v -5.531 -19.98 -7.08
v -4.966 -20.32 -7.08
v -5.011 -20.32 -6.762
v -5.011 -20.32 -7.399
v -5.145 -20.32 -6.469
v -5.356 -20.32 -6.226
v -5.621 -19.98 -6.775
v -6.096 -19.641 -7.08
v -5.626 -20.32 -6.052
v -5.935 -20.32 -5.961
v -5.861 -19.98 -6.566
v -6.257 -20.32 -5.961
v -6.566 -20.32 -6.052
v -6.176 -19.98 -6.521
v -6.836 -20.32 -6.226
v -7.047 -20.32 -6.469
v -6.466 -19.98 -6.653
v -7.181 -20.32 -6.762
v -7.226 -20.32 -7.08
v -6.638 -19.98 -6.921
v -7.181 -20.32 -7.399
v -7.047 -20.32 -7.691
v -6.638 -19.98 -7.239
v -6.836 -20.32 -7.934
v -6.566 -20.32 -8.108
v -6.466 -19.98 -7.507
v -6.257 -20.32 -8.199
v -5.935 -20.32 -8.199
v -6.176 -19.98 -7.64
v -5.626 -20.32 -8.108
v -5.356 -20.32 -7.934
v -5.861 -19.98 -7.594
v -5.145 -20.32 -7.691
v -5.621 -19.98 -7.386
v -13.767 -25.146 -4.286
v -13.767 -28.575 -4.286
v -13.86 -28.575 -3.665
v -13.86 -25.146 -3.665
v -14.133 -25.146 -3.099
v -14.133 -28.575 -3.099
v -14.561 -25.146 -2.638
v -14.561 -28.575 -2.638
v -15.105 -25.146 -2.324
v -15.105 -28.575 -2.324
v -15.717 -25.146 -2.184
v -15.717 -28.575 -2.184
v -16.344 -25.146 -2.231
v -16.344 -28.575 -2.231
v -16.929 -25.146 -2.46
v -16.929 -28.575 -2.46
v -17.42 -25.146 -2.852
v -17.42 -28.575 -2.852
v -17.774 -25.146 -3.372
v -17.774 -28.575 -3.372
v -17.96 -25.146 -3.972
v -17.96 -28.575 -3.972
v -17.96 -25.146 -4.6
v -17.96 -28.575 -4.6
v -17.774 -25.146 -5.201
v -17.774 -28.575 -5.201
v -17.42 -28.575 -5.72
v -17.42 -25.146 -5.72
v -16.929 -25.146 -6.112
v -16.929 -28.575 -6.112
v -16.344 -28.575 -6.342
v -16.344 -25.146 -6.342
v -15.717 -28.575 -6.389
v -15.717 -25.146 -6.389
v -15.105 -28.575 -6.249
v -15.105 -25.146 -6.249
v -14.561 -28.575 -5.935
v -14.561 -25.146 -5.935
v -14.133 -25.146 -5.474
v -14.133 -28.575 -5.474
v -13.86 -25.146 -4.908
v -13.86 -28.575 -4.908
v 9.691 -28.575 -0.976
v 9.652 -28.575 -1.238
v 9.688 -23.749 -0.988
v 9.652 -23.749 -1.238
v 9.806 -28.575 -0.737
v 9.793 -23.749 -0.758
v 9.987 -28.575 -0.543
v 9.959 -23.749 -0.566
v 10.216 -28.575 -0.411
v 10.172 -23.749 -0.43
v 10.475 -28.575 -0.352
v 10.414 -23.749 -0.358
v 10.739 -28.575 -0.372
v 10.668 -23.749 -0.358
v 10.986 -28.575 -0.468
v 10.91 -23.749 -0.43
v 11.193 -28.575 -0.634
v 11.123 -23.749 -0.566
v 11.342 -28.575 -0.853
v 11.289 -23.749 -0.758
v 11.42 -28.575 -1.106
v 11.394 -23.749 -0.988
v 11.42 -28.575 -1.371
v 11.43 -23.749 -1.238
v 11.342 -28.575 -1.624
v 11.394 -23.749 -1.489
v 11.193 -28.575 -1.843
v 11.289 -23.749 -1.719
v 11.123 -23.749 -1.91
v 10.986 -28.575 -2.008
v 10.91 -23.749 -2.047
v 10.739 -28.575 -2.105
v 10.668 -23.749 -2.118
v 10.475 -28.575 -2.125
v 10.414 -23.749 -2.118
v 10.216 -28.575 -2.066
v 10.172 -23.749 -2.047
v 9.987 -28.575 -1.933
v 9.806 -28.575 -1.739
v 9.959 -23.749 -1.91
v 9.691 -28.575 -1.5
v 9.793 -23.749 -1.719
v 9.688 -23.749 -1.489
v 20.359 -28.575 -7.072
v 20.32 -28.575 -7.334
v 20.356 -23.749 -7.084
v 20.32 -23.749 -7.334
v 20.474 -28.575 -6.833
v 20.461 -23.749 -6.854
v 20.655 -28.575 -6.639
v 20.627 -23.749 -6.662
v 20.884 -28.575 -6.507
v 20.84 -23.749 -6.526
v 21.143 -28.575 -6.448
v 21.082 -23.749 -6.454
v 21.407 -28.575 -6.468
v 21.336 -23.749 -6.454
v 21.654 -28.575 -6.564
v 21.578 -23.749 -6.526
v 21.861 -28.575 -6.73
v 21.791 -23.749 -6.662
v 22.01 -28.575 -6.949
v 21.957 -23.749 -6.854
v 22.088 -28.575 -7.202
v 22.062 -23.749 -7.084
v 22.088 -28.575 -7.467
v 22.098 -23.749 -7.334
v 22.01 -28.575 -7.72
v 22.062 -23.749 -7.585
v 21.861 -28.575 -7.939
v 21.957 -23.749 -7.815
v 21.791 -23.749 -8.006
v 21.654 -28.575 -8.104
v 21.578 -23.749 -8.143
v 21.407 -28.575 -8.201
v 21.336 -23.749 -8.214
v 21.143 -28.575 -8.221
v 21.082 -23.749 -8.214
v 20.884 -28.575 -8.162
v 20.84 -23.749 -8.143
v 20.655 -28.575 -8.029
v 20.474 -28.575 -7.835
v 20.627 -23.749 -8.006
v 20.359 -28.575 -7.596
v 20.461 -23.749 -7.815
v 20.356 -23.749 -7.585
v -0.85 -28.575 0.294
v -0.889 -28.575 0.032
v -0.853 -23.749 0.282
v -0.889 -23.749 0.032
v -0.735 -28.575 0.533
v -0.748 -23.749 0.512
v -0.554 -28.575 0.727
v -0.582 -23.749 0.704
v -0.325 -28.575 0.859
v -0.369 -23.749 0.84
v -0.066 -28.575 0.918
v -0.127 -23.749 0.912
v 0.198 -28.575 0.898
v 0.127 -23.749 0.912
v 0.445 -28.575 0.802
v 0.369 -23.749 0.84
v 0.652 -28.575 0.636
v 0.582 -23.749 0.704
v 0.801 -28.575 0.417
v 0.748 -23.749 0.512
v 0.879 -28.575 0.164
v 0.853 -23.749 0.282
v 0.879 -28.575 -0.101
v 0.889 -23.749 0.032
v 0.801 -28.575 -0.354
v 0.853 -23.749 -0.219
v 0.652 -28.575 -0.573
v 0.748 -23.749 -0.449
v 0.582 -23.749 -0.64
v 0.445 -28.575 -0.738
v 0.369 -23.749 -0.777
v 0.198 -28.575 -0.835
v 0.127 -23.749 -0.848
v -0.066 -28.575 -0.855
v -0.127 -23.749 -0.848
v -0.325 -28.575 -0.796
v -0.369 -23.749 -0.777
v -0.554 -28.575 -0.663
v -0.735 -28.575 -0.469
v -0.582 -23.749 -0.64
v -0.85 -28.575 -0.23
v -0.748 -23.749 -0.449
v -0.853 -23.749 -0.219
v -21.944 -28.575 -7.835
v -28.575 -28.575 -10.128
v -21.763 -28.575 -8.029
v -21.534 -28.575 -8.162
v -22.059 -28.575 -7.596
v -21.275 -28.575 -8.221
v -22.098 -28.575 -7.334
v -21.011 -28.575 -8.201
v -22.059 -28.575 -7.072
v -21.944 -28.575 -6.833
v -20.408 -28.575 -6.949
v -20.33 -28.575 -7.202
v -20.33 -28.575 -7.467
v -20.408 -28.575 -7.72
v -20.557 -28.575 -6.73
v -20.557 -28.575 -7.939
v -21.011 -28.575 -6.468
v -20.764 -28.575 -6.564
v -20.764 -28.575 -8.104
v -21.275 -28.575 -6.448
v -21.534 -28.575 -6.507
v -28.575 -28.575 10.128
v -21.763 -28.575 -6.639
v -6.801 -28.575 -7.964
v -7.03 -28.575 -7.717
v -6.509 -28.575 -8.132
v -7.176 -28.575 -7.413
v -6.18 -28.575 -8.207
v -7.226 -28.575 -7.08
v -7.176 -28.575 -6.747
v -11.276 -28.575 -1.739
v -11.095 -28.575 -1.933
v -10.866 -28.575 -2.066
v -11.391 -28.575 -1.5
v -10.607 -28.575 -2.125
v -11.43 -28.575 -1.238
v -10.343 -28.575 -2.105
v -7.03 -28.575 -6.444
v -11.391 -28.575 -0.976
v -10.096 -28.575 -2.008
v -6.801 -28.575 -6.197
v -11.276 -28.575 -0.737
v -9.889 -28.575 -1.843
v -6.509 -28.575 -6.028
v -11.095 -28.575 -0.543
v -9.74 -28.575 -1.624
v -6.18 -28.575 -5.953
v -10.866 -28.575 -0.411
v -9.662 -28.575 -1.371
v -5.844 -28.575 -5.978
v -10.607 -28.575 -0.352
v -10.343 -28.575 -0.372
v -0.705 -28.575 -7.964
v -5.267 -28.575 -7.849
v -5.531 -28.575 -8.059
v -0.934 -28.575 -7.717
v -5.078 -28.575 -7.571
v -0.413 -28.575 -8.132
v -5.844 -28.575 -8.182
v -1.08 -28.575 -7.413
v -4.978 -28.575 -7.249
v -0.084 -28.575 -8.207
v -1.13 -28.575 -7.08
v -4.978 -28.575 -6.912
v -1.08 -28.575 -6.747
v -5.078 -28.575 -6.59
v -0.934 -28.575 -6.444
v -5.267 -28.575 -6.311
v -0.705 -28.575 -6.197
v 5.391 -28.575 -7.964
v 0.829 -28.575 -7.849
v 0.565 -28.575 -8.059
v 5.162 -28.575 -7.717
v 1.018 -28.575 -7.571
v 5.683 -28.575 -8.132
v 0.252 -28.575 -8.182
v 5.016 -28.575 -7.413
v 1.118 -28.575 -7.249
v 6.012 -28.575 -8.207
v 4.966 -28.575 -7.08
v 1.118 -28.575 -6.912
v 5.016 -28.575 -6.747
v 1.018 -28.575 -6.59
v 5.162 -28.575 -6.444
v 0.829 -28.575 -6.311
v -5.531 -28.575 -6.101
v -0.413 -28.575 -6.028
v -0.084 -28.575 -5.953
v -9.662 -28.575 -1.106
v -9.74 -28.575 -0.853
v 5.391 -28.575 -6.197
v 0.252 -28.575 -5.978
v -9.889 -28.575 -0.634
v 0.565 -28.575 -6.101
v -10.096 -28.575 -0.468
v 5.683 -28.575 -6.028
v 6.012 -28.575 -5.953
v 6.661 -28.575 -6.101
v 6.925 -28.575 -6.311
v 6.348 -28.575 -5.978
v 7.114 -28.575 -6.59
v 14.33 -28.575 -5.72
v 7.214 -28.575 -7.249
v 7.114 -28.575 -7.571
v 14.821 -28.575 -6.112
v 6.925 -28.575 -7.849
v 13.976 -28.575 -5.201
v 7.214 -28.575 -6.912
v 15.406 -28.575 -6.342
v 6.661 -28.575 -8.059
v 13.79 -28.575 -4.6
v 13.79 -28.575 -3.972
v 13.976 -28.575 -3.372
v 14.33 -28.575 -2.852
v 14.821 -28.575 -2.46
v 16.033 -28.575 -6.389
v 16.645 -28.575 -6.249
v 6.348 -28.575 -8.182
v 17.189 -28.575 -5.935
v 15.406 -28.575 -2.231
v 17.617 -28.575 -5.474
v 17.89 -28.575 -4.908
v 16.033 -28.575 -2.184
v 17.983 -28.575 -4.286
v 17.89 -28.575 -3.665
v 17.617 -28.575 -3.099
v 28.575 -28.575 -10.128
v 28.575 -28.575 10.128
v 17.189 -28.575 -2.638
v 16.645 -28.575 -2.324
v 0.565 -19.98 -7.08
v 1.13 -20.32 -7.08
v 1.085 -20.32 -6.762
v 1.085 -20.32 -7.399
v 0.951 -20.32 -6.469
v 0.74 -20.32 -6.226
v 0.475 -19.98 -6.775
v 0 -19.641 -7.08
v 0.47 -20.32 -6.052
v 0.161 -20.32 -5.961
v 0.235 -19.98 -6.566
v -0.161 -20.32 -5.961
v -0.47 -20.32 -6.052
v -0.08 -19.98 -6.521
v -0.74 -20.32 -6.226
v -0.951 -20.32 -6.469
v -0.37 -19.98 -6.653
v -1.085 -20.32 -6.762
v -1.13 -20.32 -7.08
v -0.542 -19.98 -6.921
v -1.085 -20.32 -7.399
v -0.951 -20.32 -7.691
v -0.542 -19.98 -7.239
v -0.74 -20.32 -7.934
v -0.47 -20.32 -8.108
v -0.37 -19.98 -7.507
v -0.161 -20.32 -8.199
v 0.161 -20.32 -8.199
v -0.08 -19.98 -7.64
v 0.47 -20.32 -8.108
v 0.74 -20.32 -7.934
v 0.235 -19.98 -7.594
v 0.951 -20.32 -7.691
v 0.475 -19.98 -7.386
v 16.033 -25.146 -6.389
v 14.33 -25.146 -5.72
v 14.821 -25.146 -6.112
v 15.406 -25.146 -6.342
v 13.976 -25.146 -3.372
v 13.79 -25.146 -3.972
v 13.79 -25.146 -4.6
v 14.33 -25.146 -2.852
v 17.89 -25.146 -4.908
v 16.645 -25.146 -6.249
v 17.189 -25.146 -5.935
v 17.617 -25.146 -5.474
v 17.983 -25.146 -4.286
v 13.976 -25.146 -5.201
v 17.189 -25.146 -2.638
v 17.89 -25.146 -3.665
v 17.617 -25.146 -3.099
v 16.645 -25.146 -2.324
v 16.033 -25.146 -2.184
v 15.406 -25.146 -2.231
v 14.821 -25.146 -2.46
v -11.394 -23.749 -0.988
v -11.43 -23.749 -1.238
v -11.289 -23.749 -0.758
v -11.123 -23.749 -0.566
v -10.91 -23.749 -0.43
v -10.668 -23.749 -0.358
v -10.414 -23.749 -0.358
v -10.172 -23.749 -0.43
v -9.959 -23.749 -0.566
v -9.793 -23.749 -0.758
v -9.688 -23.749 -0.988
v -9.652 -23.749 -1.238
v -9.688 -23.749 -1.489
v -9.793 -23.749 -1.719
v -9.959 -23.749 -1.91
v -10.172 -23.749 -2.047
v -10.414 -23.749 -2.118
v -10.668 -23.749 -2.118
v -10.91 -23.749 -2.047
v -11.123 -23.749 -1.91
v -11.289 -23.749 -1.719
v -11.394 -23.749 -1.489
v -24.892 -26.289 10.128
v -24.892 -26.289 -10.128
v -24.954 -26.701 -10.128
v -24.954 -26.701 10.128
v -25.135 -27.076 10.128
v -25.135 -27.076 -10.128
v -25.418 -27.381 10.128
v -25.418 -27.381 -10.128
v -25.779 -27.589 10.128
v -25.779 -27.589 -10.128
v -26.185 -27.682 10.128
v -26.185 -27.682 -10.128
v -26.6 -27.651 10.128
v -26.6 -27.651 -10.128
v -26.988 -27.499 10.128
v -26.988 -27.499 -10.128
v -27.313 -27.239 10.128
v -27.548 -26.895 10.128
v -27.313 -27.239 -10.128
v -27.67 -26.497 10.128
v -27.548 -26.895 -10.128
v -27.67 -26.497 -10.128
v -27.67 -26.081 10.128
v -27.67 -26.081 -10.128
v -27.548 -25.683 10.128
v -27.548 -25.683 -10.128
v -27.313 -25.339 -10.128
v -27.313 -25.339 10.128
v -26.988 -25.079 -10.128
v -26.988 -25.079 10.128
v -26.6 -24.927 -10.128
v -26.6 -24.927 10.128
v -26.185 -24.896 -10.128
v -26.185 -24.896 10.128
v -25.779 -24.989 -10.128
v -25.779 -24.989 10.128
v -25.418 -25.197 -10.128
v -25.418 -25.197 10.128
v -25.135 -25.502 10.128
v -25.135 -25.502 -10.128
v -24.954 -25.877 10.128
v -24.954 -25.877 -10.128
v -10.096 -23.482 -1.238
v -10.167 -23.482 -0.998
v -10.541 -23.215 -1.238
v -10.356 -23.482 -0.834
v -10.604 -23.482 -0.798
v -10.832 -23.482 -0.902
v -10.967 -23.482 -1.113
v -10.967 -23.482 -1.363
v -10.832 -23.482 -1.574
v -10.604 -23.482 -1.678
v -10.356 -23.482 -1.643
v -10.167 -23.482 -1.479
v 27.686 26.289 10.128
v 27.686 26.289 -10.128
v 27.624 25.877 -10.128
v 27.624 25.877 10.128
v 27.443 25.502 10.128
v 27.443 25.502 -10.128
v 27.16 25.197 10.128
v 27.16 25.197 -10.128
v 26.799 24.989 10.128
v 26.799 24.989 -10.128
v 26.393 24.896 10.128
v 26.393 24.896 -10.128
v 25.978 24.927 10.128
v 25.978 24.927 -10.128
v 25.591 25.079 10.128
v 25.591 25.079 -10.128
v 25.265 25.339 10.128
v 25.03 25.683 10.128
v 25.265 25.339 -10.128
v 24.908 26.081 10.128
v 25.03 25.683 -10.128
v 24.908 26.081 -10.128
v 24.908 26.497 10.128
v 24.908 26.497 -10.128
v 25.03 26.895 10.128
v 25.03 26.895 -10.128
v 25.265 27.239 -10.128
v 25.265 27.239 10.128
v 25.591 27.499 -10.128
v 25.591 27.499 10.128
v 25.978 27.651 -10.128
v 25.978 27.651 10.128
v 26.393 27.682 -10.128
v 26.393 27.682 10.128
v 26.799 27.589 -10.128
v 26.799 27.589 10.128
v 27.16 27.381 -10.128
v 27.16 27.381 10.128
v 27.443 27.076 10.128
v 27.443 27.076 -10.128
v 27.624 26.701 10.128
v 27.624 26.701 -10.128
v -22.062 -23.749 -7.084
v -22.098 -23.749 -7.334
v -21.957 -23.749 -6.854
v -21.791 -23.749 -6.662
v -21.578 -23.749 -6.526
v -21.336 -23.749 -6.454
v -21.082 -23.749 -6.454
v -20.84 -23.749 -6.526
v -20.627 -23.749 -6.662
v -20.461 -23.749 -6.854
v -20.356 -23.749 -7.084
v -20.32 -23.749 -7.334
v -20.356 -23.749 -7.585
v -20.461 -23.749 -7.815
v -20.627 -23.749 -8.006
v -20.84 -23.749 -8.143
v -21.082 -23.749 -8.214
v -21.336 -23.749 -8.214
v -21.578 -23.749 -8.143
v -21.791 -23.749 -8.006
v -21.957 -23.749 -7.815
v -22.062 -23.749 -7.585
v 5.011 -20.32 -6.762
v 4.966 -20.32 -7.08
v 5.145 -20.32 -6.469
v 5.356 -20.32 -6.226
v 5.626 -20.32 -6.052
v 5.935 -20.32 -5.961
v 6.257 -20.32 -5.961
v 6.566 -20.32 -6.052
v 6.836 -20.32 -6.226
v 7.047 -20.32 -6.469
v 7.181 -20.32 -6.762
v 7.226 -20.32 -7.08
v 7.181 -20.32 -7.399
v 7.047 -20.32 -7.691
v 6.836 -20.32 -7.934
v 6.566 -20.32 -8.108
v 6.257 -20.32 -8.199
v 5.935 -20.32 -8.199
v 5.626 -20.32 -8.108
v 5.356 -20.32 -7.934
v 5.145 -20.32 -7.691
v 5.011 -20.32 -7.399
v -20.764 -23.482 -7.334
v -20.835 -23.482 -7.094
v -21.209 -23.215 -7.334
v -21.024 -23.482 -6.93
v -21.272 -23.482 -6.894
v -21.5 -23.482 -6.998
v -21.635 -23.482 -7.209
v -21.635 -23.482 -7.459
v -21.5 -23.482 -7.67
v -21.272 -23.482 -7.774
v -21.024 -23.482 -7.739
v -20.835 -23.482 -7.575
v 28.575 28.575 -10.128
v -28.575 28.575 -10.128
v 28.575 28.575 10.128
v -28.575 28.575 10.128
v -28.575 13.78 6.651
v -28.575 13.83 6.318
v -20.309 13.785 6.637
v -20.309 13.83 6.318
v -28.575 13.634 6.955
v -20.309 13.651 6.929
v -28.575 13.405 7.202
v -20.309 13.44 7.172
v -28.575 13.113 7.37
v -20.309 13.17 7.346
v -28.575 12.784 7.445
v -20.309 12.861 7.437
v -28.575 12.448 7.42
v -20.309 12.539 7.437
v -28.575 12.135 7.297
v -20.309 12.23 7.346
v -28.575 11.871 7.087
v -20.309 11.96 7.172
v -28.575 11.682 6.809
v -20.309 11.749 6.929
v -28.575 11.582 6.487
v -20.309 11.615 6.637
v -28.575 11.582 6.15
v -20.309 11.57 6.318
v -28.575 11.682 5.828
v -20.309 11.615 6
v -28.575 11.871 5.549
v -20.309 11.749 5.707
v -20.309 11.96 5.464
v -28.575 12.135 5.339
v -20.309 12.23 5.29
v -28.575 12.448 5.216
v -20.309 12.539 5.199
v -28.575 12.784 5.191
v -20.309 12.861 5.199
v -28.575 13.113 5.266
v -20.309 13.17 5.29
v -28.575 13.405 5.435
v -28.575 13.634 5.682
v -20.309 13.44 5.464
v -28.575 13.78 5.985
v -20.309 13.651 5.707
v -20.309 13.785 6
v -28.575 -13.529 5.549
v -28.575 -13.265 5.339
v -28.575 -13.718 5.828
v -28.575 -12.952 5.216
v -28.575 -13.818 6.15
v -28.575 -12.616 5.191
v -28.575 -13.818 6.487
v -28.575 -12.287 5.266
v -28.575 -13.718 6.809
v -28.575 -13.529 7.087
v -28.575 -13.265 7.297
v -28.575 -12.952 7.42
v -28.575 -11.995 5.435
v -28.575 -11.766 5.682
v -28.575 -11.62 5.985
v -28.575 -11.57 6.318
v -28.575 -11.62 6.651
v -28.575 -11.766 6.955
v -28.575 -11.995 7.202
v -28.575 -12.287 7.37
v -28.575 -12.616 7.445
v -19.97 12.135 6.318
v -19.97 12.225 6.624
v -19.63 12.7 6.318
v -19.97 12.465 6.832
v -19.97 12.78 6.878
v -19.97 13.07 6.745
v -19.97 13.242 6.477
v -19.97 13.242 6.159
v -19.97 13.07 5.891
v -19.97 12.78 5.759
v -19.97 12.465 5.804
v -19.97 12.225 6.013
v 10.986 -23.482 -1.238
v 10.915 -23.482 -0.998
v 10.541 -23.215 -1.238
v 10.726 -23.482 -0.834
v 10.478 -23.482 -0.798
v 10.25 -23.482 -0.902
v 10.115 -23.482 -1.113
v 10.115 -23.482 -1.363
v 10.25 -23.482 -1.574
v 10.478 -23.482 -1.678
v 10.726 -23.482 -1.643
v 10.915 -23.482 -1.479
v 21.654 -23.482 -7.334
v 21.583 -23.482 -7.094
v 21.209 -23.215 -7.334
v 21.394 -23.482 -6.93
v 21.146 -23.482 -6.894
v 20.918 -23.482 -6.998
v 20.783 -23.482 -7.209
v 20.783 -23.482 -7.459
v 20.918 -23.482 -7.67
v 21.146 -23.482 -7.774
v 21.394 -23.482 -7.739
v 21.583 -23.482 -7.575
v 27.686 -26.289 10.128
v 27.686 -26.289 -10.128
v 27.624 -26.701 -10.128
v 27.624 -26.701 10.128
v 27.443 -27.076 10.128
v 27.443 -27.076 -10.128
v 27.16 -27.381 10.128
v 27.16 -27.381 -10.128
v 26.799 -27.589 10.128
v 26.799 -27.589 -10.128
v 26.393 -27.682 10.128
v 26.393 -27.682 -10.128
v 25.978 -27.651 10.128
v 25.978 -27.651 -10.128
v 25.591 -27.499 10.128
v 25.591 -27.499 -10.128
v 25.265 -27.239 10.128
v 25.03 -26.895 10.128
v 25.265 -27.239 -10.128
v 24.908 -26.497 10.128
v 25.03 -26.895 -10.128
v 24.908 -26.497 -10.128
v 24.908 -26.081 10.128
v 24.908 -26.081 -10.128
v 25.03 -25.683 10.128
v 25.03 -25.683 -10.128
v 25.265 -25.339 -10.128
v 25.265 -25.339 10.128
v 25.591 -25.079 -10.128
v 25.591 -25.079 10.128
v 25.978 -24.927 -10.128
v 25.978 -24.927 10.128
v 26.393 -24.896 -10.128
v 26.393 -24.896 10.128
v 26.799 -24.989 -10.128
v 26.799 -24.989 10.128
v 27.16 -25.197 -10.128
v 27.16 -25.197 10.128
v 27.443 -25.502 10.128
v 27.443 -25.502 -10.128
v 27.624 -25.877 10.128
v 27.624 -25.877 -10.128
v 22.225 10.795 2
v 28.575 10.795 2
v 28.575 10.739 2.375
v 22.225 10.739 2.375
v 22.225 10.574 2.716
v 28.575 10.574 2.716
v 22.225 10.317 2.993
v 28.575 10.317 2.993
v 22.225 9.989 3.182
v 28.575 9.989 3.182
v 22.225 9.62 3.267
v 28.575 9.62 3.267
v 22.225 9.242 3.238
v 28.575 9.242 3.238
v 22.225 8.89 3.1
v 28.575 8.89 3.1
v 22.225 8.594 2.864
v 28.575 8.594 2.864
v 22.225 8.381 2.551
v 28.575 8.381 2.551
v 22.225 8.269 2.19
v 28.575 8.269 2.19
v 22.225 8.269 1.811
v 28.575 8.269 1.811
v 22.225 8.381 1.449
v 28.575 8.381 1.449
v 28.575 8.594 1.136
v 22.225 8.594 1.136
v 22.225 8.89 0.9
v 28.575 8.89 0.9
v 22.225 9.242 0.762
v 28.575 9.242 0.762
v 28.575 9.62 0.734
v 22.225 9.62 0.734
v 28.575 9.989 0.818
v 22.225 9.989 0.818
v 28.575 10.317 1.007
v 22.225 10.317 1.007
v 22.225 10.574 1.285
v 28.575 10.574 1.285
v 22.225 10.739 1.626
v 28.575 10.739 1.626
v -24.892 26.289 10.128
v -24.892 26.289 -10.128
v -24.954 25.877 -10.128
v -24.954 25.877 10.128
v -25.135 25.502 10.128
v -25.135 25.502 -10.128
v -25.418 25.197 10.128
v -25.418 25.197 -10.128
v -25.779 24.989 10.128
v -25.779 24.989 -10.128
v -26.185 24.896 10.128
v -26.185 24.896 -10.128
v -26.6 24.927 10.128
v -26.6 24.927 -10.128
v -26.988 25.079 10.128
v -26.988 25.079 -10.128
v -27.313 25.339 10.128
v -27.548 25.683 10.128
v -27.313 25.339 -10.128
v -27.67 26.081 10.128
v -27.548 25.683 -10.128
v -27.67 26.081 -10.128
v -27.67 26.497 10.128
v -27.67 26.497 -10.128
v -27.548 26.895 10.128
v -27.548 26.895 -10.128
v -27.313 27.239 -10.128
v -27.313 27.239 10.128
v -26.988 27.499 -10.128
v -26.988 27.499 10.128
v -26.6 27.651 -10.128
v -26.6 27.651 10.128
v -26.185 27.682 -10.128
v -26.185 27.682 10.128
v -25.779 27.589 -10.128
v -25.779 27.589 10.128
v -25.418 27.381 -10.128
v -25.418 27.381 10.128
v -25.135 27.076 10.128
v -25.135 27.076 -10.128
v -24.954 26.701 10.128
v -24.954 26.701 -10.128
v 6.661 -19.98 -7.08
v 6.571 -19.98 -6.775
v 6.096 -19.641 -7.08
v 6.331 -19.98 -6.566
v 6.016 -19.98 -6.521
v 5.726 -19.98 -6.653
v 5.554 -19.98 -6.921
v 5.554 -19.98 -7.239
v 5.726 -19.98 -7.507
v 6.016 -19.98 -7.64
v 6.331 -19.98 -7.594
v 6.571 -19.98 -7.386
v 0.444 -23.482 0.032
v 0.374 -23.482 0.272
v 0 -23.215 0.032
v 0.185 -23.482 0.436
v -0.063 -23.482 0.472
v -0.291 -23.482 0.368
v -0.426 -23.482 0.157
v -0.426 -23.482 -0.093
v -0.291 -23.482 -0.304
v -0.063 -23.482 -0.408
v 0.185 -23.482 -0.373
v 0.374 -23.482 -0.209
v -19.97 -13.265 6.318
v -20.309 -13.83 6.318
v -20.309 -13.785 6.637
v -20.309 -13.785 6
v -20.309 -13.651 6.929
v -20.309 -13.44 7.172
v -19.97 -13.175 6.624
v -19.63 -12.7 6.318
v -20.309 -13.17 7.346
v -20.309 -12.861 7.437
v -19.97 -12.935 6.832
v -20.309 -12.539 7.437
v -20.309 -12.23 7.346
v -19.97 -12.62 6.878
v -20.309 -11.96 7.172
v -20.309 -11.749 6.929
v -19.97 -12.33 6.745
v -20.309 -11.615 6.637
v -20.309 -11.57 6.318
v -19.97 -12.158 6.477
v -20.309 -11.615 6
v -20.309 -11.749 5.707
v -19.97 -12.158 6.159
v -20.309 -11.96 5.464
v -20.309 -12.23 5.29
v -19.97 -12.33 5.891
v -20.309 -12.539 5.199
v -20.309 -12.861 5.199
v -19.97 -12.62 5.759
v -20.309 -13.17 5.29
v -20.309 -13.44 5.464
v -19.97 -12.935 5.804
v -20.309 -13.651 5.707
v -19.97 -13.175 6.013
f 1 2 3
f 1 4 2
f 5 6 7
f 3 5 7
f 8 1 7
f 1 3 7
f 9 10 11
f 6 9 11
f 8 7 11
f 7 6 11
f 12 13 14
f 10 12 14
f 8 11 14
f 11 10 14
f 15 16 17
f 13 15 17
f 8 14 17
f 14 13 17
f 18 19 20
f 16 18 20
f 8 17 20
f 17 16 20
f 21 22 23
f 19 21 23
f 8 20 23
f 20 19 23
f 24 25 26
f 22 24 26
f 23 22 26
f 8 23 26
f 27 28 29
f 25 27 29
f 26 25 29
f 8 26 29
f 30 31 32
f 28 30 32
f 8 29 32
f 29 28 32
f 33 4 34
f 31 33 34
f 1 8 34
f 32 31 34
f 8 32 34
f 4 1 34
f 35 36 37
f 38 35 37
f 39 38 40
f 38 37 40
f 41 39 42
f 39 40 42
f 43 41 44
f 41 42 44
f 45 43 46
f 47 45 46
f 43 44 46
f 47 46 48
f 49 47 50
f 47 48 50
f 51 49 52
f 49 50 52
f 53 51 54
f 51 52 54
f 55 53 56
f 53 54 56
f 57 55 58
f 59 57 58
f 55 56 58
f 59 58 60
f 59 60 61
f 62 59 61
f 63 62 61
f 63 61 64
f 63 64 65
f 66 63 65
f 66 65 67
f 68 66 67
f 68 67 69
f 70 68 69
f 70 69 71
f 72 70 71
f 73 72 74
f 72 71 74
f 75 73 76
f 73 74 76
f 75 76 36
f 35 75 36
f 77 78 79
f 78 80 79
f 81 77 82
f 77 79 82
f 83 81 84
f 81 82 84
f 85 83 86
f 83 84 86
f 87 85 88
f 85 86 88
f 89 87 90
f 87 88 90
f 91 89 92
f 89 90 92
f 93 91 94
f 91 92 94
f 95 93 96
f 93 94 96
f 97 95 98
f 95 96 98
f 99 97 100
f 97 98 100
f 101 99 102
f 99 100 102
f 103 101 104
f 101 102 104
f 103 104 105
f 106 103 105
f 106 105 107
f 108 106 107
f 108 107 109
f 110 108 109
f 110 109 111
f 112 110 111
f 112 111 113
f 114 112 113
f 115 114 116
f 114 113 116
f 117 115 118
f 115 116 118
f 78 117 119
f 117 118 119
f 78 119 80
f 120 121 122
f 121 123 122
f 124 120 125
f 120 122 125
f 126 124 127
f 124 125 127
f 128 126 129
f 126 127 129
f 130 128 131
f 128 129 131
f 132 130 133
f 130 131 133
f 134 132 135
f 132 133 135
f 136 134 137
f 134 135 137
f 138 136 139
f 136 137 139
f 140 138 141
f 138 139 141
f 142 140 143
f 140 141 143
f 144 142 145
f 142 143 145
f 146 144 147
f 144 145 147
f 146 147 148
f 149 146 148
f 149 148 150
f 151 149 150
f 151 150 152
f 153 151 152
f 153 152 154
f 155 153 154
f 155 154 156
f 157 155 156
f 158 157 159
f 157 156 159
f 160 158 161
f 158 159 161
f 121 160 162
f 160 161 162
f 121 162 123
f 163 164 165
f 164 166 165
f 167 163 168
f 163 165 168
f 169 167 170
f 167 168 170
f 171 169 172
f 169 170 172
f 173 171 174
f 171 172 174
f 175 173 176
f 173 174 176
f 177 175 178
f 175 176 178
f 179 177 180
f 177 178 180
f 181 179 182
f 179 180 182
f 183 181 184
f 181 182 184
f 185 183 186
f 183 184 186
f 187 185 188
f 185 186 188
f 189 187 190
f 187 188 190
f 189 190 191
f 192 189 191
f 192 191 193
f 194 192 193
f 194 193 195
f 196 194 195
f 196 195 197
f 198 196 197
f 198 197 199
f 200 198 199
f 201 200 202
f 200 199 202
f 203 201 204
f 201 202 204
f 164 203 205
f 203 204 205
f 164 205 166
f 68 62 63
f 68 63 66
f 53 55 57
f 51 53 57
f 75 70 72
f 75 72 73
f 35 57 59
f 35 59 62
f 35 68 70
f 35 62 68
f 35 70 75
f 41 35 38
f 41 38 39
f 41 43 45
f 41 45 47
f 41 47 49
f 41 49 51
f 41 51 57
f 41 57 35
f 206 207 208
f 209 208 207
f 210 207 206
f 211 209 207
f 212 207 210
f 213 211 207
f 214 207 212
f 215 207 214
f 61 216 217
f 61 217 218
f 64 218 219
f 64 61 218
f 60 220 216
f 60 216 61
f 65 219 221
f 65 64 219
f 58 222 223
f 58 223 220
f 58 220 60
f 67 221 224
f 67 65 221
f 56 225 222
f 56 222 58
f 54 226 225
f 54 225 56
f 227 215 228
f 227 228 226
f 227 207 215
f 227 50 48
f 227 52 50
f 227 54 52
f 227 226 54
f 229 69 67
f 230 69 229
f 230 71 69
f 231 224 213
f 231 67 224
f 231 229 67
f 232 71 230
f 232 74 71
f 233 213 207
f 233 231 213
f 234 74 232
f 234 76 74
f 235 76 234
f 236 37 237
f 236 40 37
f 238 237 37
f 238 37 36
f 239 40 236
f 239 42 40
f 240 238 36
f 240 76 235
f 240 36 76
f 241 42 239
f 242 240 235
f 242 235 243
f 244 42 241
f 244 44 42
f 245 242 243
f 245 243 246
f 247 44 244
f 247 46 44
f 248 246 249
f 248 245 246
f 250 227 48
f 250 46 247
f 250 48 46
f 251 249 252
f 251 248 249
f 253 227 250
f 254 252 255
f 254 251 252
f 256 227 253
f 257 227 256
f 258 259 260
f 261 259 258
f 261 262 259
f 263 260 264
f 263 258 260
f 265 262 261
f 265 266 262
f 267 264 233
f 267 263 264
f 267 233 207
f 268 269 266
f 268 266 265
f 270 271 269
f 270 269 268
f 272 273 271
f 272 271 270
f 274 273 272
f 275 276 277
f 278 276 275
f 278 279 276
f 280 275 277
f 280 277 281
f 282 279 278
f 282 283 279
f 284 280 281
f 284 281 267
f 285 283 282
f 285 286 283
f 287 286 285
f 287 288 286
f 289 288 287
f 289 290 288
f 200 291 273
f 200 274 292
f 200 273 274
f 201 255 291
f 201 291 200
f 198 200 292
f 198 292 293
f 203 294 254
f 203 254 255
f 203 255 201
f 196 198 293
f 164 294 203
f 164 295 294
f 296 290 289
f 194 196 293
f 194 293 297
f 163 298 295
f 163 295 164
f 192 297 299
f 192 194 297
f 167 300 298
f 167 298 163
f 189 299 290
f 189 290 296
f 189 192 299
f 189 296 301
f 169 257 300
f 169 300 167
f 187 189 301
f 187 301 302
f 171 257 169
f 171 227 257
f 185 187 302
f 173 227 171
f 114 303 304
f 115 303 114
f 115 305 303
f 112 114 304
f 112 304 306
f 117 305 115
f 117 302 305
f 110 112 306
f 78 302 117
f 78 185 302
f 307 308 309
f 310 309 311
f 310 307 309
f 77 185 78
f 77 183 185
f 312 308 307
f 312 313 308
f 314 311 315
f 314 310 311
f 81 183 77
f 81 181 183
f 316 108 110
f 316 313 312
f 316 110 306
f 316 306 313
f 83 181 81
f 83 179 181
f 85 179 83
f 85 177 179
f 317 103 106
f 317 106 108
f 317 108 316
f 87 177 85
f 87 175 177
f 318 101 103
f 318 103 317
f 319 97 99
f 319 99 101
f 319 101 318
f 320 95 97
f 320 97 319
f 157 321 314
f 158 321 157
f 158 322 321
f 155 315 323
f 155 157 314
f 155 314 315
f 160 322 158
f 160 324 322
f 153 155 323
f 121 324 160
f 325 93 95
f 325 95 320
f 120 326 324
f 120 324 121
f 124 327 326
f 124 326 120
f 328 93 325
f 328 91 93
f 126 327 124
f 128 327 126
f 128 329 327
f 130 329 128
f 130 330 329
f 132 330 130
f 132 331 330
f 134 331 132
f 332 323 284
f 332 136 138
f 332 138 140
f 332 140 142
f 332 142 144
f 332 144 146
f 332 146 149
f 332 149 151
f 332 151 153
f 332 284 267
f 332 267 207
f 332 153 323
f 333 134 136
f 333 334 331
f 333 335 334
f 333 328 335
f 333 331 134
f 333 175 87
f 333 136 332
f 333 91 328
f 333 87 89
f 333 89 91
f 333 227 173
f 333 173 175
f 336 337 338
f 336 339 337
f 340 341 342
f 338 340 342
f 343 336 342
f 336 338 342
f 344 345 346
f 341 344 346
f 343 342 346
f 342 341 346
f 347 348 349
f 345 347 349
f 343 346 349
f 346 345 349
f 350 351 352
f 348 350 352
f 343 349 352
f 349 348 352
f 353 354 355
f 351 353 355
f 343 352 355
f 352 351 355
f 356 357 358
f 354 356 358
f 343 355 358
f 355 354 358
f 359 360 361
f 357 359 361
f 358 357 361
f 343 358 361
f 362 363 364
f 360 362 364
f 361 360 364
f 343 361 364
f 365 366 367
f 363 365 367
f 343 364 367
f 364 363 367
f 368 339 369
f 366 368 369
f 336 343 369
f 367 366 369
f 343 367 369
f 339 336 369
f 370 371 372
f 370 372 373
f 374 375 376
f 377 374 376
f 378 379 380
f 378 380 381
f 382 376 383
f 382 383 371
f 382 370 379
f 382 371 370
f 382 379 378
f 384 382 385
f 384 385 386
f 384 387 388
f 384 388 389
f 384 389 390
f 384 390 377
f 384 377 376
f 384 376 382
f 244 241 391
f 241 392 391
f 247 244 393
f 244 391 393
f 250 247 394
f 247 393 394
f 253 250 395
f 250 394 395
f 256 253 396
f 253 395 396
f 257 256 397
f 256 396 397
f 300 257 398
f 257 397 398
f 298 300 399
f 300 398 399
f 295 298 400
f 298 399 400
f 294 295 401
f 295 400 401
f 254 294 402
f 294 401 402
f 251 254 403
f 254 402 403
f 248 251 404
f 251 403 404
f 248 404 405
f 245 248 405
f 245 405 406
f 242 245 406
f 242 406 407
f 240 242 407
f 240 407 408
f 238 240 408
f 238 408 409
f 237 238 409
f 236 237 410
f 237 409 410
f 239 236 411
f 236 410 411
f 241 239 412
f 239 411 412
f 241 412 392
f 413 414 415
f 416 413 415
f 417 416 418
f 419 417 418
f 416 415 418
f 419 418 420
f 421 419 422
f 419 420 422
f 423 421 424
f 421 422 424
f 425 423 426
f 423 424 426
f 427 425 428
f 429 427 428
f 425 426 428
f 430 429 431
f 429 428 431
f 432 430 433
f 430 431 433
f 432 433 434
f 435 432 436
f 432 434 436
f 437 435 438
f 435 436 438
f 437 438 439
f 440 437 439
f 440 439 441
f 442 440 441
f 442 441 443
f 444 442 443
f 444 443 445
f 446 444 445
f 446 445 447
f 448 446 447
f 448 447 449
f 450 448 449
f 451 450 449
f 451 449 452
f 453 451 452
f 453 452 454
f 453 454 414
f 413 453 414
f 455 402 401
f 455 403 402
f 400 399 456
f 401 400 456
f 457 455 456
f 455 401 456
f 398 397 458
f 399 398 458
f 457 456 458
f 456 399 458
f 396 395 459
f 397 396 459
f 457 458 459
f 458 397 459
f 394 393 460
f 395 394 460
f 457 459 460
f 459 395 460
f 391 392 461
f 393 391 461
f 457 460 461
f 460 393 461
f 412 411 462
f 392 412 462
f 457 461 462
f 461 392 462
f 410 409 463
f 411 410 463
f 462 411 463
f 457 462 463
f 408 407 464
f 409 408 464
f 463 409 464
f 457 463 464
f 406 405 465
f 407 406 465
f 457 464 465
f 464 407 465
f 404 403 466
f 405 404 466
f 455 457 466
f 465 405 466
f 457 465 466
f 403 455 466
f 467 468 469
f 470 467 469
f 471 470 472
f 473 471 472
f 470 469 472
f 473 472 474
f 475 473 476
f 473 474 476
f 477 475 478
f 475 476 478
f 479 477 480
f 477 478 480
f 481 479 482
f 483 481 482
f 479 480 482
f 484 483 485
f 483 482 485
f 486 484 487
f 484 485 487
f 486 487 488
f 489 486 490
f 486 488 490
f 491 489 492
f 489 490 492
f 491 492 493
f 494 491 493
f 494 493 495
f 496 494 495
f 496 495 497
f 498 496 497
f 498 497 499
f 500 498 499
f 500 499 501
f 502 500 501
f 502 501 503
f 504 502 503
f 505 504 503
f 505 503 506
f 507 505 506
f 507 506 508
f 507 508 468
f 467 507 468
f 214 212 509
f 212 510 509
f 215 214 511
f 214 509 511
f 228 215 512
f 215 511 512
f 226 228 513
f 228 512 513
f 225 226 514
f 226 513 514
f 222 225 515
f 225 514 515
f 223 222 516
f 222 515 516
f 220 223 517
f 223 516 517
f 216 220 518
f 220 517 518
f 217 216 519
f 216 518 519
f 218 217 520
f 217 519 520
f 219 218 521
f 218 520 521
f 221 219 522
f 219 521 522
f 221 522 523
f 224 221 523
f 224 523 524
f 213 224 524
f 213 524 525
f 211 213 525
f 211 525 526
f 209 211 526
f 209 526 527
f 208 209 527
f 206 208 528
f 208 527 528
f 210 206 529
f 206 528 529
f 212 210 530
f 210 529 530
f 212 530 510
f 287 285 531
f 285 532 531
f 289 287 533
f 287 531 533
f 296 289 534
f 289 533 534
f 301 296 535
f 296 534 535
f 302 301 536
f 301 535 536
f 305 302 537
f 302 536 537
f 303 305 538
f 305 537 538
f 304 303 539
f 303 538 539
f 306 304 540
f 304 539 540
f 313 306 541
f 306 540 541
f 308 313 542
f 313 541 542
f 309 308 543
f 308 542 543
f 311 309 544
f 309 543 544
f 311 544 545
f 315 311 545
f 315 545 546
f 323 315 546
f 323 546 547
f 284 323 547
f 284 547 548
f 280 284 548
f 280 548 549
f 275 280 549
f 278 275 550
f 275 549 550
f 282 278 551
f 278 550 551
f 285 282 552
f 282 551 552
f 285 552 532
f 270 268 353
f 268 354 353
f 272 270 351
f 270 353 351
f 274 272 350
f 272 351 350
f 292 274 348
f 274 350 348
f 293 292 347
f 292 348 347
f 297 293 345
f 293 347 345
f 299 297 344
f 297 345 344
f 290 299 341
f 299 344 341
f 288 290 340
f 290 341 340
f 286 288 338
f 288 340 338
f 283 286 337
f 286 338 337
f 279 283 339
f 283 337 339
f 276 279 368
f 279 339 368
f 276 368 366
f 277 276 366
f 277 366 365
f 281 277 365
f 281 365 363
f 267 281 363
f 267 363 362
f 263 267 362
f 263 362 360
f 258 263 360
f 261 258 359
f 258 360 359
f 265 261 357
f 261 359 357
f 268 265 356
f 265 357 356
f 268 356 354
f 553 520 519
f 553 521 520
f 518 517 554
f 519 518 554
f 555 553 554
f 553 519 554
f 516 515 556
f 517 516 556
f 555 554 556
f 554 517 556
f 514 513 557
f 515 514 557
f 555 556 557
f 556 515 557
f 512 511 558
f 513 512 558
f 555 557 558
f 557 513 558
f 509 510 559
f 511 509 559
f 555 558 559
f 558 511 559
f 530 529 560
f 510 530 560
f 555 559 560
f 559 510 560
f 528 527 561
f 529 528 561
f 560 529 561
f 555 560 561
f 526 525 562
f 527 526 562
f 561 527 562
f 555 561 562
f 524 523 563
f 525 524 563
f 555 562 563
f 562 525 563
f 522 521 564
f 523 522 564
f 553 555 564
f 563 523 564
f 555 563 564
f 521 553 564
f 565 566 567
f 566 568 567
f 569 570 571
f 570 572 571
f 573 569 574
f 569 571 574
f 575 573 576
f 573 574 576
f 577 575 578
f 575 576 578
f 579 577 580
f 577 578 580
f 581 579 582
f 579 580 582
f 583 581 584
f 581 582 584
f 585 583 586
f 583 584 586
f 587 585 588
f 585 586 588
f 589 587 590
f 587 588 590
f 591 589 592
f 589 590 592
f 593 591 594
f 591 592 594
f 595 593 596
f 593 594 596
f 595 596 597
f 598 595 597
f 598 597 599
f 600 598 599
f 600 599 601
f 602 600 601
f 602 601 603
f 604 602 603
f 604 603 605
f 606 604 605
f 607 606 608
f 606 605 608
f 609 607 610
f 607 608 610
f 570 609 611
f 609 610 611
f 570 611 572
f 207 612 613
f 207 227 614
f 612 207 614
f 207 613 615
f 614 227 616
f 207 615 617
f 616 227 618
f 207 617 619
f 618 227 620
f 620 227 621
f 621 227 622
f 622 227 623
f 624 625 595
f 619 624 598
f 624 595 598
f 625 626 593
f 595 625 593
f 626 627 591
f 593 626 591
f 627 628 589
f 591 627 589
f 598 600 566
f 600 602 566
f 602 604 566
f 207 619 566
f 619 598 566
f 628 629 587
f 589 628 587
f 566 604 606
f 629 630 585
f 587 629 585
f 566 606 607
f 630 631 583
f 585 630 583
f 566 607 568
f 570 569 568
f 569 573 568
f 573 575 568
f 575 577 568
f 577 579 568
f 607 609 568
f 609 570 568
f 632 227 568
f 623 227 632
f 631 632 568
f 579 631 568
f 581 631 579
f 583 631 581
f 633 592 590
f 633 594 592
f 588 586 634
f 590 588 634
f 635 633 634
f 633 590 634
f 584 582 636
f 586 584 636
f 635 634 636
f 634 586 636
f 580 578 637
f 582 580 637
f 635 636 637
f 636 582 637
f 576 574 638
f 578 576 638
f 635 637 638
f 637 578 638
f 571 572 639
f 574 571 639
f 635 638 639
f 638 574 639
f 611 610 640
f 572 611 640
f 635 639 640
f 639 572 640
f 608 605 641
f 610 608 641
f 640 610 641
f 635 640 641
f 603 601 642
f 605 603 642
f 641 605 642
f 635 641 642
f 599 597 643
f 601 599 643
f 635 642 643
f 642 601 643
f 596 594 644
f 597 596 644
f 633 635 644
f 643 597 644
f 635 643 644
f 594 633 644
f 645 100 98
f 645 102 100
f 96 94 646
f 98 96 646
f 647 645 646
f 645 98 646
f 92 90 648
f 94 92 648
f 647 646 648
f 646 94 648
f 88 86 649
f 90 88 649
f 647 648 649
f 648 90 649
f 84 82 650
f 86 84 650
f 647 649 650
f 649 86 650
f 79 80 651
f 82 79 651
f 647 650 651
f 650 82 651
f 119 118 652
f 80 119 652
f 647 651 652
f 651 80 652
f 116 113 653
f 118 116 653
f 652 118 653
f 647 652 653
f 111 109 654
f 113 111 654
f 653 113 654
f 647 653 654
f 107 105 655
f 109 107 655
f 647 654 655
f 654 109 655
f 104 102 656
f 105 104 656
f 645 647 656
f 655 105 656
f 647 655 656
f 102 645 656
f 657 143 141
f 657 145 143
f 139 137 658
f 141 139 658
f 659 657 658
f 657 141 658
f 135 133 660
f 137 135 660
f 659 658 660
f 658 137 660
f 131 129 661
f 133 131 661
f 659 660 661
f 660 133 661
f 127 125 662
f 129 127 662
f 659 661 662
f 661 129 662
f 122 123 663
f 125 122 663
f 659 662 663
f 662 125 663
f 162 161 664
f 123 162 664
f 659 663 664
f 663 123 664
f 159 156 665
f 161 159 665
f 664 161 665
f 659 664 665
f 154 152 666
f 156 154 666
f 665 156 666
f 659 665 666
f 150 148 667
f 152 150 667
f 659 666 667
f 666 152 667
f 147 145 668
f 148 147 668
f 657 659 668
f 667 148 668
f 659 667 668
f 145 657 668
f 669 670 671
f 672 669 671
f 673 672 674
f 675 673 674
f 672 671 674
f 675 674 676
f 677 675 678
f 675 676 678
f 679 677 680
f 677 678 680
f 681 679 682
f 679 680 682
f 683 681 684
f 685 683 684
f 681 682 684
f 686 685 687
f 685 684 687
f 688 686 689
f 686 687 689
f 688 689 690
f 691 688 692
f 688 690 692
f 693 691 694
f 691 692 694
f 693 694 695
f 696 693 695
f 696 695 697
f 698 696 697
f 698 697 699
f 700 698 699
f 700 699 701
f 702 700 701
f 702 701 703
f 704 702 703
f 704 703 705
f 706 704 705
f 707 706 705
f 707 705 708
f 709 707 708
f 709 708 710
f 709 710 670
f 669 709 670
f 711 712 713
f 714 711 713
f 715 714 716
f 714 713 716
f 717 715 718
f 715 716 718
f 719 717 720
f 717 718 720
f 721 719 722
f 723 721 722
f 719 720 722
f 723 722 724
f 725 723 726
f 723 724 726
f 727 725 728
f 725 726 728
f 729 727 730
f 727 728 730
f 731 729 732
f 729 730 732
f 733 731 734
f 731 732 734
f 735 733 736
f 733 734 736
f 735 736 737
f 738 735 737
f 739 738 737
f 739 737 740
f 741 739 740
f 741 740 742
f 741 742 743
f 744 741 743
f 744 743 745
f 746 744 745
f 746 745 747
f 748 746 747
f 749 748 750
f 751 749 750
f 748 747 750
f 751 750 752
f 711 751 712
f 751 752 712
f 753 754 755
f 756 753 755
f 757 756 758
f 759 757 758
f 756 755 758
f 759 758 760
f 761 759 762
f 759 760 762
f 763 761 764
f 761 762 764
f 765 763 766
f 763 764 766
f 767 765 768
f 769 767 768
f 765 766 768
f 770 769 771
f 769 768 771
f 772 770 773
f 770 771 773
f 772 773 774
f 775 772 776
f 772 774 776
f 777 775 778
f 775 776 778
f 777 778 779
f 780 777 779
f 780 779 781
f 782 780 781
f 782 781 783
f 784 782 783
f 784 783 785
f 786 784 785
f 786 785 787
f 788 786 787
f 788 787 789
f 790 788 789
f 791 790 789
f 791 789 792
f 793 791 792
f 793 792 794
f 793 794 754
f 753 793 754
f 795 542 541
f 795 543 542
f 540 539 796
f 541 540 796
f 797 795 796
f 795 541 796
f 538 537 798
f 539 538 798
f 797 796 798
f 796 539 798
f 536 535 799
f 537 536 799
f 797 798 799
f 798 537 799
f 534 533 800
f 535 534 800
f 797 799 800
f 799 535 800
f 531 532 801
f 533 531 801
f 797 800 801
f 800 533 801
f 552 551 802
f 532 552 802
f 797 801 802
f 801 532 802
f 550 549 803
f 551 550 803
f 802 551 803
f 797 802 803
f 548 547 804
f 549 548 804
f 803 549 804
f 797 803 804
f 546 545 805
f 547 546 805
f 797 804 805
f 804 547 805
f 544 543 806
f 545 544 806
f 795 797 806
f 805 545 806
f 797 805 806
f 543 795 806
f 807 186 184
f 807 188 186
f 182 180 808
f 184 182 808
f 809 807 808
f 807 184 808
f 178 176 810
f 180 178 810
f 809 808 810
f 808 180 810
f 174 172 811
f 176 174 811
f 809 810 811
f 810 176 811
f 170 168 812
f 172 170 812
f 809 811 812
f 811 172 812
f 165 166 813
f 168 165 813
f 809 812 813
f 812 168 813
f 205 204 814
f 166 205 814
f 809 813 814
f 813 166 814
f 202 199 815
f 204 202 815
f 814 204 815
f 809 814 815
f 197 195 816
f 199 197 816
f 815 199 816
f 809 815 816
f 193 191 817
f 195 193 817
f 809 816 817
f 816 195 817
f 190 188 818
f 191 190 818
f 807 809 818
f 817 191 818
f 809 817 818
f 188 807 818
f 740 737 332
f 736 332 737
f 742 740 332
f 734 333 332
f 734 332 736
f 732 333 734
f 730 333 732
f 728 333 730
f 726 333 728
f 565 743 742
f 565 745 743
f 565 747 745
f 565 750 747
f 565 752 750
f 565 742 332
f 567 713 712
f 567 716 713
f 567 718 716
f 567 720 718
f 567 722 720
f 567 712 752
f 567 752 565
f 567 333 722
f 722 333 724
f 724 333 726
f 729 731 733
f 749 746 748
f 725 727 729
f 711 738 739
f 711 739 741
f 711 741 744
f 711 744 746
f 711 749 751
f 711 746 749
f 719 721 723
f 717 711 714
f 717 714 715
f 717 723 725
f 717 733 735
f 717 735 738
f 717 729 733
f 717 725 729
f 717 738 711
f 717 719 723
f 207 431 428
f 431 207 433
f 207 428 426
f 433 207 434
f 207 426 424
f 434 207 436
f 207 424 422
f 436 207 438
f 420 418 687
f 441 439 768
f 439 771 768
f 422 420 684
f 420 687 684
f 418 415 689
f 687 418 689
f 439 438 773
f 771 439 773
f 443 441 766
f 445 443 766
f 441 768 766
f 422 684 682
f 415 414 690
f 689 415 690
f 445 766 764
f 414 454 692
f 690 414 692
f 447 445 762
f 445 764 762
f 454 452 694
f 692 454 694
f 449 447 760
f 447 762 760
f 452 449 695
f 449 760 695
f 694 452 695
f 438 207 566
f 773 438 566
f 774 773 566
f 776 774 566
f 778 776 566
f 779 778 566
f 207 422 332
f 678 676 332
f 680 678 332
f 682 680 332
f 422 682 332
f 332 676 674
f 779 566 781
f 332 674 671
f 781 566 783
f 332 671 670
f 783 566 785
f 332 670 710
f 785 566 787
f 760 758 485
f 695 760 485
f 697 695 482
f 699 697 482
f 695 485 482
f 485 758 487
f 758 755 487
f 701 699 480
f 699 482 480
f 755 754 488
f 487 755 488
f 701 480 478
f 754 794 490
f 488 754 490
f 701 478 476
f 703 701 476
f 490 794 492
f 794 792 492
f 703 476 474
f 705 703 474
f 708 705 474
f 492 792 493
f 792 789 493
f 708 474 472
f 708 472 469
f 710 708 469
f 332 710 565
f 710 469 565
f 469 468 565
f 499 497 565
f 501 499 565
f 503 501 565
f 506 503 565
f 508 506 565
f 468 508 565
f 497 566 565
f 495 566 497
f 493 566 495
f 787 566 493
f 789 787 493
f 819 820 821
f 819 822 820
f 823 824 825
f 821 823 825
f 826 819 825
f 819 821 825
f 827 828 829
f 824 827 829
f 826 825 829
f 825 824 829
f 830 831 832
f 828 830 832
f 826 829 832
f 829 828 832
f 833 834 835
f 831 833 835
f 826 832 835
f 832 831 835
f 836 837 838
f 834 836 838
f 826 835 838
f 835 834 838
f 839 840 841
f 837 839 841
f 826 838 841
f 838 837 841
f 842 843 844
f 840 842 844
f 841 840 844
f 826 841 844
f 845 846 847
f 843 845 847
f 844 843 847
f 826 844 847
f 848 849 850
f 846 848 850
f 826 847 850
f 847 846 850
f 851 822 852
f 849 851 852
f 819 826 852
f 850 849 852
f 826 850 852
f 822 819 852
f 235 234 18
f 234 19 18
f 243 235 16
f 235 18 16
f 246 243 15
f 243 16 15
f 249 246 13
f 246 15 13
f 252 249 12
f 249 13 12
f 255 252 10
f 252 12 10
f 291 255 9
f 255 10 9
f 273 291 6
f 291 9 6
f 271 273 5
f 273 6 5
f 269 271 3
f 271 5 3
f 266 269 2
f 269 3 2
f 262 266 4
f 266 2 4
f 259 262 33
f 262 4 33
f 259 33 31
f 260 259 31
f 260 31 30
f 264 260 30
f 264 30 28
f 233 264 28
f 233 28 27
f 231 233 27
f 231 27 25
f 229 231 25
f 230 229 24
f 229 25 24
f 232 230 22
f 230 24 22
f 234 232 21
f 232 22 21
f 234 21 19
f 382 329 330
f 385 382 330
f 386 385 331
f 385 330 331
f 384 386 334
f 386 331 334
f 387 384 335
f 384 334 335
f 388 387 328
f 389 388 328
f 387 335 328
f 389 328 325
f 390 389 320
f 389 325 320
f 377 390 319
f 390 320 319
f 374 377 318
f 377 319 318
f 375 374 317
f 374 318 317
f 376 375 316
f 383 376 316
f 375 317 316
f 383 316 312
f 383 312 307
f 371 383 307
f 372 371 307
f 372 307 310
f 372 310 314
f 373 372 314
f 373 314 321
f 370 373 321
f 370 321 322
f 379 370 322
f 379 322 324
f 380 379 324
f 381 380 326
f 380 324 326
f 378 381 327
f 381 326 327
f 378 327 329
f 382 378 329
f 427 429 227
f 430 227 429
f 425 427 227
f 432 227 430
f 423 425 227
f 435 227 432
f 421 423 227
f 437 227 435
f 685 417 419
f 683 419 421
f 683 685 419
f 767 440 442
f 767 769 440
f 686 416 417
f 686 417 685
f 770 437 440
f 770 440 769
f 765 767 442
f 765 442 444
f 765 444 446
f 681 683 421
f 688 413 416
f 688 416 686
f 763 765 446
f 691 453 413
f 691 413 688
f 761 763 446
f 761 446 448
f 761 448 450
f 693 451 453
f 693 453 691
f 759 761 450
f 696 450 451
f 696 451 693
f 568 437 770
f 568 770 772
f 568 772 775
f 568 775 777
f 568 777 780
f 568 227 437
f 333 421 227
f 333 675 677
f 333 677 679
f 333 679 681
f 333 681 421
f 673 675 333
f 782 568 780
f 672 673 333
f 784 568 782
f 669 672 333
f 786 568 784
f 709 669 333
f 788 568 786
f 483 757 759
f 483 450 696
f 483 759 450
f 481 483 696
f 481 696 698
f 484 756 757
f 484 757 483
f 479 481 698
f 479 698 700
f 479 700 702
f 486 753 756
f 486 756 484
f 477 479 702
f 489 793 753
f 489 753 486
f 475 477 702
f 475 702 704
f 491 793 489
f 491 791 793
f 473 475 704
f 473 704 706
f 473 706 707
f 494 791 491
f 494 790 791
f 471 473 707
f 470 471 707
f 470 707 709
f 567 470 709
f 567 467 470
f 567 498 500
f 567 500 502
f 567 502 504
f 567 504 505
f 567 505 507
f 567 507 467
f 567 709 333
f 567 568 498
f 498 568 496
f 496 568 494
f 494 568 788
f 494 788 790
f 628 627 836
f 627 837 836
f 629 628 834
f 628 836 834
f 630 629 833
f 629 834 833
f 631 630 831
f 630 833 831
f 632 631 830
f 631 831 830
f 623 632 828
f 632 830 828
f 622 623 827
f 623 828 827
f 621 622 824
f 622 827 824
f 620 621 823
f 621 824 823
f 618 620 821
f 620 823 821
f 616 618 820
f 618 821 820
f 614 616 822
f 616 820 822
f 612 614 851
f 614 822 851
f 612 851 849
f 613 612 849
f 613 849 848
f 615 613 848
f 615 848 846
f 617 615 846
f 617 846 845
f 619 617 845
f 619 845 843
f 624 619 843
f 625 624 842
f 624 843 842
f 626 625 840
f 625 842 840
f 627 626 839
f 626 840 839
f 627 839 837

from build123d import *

# Parameters (mm, degrees)
F0_W             = 57.15
F0_H             = 57.15
F1_DEPTH         = 10.12825
F2_R             = 2.1082
F3_DEPTH         = 3.429
F5_R             = 1.397
F6_DEPTH         = 20.2575
F8_D             = 2.2606
F8_DEPTH         = 8.2658857143
F8_TIP           = 0.6791527577
F9_R             = 1.27
F10_DEPTH        = 6.35
F12_D            = 2.2606
F12_DEPTH        = 8.255
F12_TIP          = 0.6791527577
F14_D            = 1.778
F14_DEPTH        = 4.826
F14_TIP          = 0.5341650903
F14_ON_F13_D     = 1.778
F14_ON_F13_DEPTH = 4.826
F14_ON_F13_TIP   = 0.5341650903


with BuildPart() as f1:
    # F0 (on Top) → F1 (new body, symmetric)
    with BuildSketch(Plane.XY):
        Rectangle(F0_W, F0_H)
    extrude(amount=F1_DEPTH, both=True)

    # F2 (on face) → F3 (cut)
    with BuildSketch(Plane.XZ.offset(28.575)):
        with Locations((-15.875, -4.28625)):
            Circle(F2_R)
        with Locations((15.875, -4.28625)):
            Circle(F2_R)
    extrude(amount=-F3_DEPTH, mode=Mode.SUBTRACT)

    # F5 (on face) → F6 (cut, through all)
    with BuildSketch(Plane(origin=(0, 0, -10.12825), x_dir=(1, 0, 0), z_dir=(0, 0, -1))):
        with Locations((-26.289, 26.289)):
            Circle(F5_R)
        with Locations((26.289, 26.289)):
            Circle(F5_R)
        with Locations((26.289, -26.289)):
            Circle(F5_R)
        with Locations((-26.289, -26.289)):
            Circle(F5_R)
    extrude(amount=-F6_DEPTH, mode=Mode.SUBTRACT)

    # F8
    with Locations(Plane(origin=(-28.575, 0, 0), x_dir=(0, -1, 0), z_dir=(-1, 0, 0))):
        with Locations((12.7, 6.31825), (-12.7, 6.31825)):
            Hole(F8_D / 2, depth=F8_DEPTH)
            with Locations((0, 0, -(F8_DEPTH + F8_TIP / 2))):  # 118° drill point
                Cone(0, F8_D / 2, F8_TIP, mode=Mode.SUBTRACT)

    # F9 (on face) → F10 (cut)
    with BuildSketch(Plane.YZ.offset(28.575)):
        with Locations((9.525, 2.00025)):
            Circle(F9_R)
    extrude(amount=-F10_DEPTH, mode=Mode.SUBTRACT)

    # F12
    with Locations(Plane.XZ.offset(28.575)):
        with Locations((-6.096, -7.08025), (0, -7.08025), (6.096, -7.08025)):
            Hole(F12_D / 2, depth=F12_DEPTH)
            with Locations((0, 0, -(F12_DEPTH + F12_TIP / 2))):  # 118° drill point
                Cone(0, F12_D / 2, F12_TIP, mode=Mode.SUBTRACT)

    # F14
    with Locations(Plane.XZ.offset(28.575)):
        with Locations((-21.209, -7.33425), (-10.541, -1.23825), (10.541, -1.23825), (21.209, -7.33425)):
            Hole(F14_D / 2, depth=F14_DEPTH)
            with Locations((0, 0, -(F14_DEPTH + F14_TIP / 2))):  # 118° drill point
                Cone(0, F14_D / 2, F14_TIP, mode=Mode.SUBTRACT)

    # F14 on F13
    with Locations(Plane.XZ.offset(28.575)):
        with Locations((0, 0.03175)):
            Hole(F14_ON_F13_D / 2, depth=F14_ON_F13_DEPTH)
            with Locations((0, 0, -(F14_ON_F13_DEPTH + F14_ON_F13_TIP / 2))):  # 118° drill point
                Cone(0, F14_ON_F13_D / 2, F14_ON_F13_TIP, mode=Mode.SUBTRACT)


solid = f1.part
